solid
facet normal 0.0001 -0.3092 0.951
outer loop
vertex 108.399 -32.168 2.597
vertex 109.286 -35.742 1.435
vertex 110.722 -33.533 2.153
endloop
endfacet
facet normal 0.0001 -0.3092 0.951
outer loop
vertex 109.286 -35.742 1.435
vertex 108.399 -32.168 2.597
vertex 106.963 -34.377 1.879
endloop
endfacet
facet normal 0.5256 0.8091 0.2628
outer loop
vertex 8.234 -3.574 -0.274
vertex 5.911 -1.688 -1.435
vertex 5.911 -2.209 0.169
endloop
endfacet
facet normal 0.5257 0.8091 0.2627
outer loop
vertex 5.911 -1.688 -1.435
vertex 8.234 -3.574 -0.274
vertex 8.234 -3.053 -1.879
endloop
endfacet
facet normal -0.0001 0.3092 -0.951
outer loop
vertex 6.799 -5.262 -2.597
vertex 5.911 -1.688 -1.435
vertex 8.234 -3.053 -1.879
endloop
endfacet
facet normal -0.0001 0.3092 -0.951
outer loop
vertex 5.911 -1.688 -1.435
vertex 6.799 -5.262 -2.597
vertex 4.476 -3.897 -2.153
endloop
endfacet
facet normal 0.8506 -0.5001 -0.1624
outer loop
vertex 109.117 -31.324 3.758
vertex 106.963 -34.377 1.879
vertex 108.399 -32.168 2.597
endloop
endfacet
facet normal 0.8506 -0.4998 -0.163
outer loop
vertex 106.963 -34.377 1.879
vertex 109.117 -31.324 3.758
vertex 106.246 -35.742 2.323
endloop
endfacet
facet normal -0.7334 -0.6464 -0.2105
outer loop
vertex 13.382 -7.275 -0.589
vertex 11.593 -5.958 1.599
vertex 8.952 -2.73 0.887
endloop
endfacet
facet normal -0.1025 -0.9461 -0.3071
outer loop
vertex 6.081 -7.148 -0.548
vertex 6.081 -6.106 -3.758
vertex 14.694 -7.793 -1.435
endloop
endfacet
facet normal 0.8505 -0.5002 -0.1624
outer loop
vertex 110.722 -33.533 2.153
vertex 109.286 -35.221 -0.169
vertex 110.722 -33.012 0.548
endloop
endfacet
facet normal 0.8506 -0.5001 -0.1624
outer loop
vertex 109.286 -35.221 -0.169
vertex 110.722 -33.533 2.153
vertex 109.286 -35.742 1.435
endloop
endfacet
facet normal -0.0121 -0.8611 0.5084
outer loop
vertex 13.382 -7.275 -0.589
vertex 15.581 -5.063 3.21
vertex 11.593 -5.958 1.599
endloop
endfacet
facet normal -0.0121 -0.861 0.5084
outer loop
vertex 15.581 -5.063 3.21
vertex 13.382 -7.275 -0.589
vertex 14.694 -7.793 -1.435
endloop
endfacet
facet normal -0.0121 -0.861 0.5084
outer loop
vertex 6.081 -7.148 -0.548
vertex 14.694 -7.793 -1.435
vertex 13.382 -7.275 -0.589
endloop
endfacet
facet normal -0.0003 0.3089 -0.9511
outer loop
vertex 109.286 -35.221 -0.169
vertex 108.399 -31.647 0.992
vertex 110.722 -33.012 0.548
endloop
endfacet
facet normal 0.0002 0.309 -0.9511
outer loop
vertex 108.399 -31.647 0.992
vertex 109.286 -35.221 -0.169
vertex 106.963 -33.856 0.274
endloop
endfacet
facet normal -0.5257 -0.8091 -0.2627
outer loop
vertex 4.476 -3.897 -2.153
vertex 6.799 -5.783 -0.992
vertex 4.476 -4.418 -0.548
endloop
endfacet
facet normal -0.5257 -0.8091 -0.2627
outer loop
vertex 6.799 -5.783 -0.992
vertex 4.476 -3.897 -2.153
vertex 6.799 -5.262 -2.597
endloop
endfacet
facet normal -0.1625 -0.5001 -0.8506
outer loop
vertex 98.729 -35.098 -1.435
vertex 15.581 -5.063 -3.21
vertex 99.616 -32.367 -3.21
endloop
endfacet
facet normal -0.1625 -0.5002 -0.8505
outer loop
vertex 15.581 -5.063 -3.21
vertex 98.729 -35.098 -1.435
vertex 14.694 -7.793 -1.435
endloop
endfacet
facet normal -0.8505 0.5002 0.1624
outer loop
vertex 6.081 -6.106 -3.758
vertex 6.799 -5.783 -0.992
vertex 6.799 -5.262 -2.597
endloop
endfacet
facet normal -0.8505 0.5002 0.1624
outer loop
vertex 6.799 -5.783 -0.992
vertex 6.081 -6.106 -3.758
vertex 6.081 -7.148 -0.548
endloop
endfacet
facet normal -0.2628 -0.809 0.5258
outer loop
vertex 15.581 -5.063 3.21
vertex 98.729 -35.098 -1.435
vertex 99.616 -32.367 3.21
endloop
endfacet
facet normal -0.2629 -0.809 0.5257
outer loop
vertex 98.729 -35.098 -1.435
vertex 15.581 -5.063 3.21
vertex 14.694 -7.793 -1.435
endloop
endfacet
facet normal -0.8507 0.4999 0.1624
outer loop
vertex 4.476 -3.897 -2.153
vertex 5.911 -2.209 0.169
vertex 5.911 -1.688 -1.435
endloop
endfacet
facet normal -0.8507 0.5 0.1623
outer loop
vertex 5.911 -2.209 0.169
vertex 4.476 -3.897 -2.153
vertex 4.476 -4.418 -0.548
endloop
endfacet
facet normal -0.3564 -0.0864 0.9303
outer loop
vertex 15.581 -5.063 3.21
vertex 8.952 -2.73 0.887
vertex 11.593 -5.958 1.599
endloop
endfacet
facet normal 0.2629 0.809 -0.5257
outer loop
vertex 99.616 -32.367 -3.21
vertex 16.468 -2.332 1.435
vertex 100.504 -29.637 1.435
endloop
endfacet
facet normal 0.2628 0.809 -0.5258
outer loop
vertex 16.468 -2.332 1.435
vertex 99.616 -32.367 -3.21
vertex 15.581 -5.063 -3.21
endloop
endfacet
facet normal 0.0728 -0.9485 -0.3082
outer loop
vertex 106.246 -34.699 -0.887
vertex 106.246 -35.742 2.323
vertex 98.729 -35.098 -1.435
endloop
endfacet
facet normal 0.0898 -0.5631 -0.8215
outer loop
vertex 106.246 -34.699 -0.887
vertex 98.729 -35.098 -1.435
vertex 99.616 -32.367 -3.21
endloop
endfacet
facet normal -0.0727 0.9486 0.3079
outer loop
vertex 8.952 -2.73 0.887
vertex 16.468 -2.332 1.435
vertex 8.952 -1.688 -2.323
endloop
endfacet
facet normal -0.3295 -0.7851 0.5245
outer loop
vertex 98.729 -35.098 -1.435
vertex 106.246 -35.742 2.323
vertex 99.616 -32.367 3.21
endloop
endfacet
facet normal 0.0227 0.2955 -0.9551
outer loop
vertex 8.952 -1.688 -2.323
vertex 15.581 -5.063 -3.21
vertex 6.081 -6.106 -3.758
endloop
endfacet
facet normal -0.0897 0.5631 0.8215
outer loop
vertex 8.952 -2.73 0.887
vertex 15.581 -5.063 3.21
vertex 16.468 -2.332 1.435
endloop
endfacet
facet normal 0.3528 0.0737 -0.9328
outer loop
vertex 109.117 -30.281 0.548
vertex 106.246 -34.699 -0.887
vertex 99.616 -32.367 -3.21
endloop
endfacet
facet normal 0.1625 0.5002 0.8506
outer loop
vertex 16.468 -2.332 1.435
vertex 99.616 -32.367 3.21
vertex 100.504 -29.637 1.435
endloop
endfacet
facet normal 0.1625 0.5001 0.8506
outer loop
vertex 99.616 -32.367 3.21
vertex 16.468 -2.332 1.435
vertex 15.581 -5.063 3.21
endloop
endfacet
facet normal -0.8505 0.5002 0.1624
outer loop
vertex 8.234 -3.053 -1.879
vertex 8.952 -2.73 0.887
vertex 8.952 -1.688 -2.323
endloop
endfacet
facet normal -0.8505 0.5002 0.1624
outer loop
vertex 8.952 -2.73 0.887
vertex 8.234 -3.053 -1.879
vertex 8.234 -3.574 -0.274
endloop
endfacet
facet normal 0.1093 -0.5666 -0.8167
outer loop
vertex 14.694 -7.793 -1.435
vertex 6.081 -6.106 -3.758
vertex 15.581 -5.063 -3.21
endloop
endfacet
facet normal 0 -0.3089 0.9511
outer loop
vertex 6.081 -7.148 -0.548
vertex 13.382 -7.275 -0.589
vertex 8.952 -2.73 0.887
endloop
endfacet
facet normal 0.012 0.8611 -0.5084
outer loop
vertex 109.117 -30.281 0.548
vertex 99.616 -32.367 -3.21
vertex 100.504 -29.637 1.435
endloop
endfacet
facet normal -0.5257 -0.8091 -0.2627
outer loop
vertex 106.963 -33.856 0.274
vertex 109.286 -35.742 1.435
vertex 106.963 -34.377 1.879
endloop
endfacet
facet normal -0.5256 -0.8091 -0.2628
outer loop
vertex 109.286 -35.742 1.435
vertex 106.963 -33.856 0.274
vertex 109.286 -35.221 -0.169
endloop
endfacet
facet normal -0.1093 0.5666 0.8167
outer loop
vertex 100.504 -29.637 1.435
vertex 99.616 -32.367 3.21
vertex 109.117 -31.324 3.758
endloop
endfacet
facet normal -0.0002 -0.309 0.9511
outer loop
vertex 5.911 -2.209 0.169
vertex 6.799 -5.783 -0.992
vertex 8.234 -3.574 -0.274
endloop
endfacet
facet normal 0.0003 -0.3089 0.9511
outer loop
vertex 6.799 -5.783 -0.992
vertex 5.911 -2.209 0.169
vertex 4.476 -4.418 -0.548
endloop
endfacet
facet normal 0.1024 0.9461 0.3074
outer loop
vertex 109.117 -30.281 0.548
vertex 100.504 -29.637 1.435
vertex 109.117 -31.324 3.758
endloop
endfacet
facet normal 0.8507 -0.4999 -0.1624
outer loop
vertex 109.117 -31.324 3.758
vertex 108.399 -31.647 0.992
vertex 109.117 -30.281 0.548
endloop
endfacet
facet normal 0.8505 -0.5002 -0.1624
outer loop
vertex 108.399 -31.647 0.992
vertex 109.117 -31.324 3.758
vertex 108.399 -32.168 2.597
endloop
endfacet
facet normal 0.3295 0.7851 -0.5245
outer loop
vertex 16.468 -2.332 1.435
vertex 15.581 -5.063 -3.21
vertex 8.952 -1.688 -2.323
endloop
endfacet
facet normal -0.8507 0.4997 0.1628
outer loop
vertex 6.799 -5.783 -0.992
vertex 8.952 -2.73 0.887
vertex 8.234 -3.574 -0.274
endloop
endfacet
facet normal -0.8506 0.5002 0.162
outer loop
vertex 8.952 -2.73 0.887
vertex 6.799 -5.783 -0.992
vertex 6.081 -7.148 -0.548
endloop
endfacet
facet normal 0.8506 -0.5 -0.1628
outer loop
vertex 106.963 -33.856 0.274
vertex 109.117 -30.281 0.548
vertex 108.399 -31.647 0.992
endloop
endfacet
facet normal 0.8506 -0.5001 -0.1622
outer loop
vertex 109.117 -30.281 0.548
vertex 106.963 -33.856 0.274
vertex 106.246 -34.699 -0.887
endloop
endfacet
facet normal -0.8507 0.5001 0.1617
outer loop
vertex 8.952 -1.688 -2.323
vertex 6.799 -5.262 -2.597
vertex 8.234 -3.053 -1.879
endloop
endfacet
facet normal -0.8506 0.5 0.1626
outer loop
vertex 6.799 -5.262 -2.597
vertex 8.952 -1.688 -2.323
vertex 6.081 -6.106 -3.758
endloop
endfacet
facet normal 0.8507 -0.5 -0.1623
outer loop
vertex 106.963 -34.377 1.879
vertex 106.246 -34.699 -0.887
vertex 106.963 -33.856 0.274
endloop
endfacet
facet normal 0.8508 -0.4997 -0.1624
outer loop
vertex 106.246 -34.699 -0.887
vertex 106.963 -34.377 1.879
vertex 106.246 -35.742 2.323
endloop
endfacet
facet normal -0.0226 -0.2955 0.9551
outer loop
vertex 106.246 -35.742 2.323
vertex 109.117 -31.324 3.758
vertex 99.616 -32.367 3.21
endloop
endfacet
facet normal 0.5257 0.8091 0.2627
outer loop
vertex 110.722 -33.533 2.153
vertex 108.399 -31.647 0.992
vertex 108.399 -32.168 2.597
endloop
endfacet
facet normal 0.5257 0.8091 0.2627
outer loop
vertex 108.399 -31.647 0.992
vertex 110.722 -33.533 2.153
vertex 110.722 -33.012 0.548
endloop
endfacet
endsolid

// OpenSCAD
sc=(4+2*sqrt(5))/cos(16.5);
points=[[ -11.0901699437495, -6.85410196624968, 4.23606797749979 ],[ -11.0901699437495, -6.85410196624968, 11.0901699437495 ],[ -10.6266444521871, -6.64057647468726, 3.73606797749979 ],[ -10.5311529493745, -6.79508497187474, 3.79508497187474 ],[ -10.5311529493745, -6.48606797749979, 3.98606797749979 ],[ -10.4721359549996, -6.54508497187474, 3.42705098312484 ],[ -10.435661446562, -6.64057647468726, 4.04508497187474 ],[ -10.3766444521871, -6.54508497187474, 3.58155948031232 ],[ -10.2811529493745, -6.85410196624968, 3.54508497187474 ],[ -10.2811529493745, -6.69959346906221, 3.64057647468726 ],[ -10.2811529493745, -6.39057647468726, 3.83155948031232 ],[ -10.2811529493745, -6.23606797749979, 3.92705098312484 ],[ -10.185661446562, -6.54508497187474, 3.89057647468726 ],[ -10.0901699437495, -6.54508497187474, 4.04508497187474 ],[ -9.78115294937453, -5.61803398874989, 3.66311896062463 ],[ -9.59016994374947, -6.11803398874989, 3.35410196624968 ],[ -9.59016994374947, -5.73606797749979, 3.97213595499958 ],[ -9.39918693812442, -6.23606797749979, 3.66311896062463 ],[ -1.69098300562505, -0.618033988749895, 0.572949016875158 ],[ -1.5, -1.11803398874989, 0.26393202250021 ],[ -1.5, -0.73606797749979, 0.881966011250105 ],[ -1.3233483463104, -0.739451150766031, 0.823348346310404 ],[ -1.30901699437495, -1.23606797749979, 0.572949016875158 ],[ -1.02091060159761, -0.843753141961824, 0.674238256183693 ],[ -1, -0.309016994374947, 0.190983005625053 ],[ -0.904508497187474, -0.309016994374947, 0.345491502812526 ],[ -0.809016994374947, -0.618033988749895, 0.309016994374947 ],[ -0.809016994374947, -0.463525491562421, 0.404508497187474 ],[ -0.809016994374947, -0.154508497187474, 0.595491502812526 ],[ -0.809016994374947, 0, 0.690983005625053 ],[ -0.713525491562421, -0.309016994374947, 0.654508497187474 ],[ -0.654508497187474, -0.213525491562421, 0.190983005625053 ],[ -0.618033988749895, -0.309016994374947, 0.809016994374947 ],[ -0.559016994374947, -0.368033988749895, 0.25 ],[ -0.559016994374947, -0.0590169943749475, 0.440983005625053 ],[ -0.463525491562421, -0.213525491562421, 0.5 ],[ 0, 0, 0 ]];

scale(sc) rotate([90,0,0]) rotate([0,0,148.282526])  polyhedron(points,faces=[[ 9, 3, 6, 12 ],[ 33, 31, 25, 27 ],[ 31, 34, 28, 25 ],[ 8, 9, 12, 13 ],[ 26, 23, 21 ],[ 20, 29, 32 ],[ 3, 2, 4, 6 ],[ 23, 22, 20, 32, 21 ],[ 4, 2, 7, 10 ],[ 28, 34, 35, 30 ],[ 16, 14, 18, 20 ],[ 29, 28, 30, 32 ],[ 16, 20, 22, 17 ],[ 33, 35, 34, 31 ],[ 23, 26, 22 ],[ 19, 18, 14, 15 ],[ 16, 13, 11 ],[ 14, 16, 11 ],[ 24, 19, 26 ],[ 17, 13, 16 ],[ 29, 18, 24 ],[ 19, 22, 26 ],[ 14, 11, 5 ],[ 22, 19, 15, 17 ],[ 27, 25, 24, 26 ],[ 18, 29, 20 ],[ 26, 21, 32 ],[ 15, 14, 5 ],[ 12, 6, 4, 10 ],[ 8, 17, 15 ],[ 35, 33, 27, 30 ],[ 8, 15, 5 ],[ 7, 9, 8, 5 ],[ 24, 18, 19 ],[ 30, 27, 26, 32 ],[ 5, 11, 10, 7 ],[ 25, 28, 29, 24 ],[ 12, 10, 11, 13 ],[ 17, 8, 13 ],[ 7, 2, 3, 9 ]]);
